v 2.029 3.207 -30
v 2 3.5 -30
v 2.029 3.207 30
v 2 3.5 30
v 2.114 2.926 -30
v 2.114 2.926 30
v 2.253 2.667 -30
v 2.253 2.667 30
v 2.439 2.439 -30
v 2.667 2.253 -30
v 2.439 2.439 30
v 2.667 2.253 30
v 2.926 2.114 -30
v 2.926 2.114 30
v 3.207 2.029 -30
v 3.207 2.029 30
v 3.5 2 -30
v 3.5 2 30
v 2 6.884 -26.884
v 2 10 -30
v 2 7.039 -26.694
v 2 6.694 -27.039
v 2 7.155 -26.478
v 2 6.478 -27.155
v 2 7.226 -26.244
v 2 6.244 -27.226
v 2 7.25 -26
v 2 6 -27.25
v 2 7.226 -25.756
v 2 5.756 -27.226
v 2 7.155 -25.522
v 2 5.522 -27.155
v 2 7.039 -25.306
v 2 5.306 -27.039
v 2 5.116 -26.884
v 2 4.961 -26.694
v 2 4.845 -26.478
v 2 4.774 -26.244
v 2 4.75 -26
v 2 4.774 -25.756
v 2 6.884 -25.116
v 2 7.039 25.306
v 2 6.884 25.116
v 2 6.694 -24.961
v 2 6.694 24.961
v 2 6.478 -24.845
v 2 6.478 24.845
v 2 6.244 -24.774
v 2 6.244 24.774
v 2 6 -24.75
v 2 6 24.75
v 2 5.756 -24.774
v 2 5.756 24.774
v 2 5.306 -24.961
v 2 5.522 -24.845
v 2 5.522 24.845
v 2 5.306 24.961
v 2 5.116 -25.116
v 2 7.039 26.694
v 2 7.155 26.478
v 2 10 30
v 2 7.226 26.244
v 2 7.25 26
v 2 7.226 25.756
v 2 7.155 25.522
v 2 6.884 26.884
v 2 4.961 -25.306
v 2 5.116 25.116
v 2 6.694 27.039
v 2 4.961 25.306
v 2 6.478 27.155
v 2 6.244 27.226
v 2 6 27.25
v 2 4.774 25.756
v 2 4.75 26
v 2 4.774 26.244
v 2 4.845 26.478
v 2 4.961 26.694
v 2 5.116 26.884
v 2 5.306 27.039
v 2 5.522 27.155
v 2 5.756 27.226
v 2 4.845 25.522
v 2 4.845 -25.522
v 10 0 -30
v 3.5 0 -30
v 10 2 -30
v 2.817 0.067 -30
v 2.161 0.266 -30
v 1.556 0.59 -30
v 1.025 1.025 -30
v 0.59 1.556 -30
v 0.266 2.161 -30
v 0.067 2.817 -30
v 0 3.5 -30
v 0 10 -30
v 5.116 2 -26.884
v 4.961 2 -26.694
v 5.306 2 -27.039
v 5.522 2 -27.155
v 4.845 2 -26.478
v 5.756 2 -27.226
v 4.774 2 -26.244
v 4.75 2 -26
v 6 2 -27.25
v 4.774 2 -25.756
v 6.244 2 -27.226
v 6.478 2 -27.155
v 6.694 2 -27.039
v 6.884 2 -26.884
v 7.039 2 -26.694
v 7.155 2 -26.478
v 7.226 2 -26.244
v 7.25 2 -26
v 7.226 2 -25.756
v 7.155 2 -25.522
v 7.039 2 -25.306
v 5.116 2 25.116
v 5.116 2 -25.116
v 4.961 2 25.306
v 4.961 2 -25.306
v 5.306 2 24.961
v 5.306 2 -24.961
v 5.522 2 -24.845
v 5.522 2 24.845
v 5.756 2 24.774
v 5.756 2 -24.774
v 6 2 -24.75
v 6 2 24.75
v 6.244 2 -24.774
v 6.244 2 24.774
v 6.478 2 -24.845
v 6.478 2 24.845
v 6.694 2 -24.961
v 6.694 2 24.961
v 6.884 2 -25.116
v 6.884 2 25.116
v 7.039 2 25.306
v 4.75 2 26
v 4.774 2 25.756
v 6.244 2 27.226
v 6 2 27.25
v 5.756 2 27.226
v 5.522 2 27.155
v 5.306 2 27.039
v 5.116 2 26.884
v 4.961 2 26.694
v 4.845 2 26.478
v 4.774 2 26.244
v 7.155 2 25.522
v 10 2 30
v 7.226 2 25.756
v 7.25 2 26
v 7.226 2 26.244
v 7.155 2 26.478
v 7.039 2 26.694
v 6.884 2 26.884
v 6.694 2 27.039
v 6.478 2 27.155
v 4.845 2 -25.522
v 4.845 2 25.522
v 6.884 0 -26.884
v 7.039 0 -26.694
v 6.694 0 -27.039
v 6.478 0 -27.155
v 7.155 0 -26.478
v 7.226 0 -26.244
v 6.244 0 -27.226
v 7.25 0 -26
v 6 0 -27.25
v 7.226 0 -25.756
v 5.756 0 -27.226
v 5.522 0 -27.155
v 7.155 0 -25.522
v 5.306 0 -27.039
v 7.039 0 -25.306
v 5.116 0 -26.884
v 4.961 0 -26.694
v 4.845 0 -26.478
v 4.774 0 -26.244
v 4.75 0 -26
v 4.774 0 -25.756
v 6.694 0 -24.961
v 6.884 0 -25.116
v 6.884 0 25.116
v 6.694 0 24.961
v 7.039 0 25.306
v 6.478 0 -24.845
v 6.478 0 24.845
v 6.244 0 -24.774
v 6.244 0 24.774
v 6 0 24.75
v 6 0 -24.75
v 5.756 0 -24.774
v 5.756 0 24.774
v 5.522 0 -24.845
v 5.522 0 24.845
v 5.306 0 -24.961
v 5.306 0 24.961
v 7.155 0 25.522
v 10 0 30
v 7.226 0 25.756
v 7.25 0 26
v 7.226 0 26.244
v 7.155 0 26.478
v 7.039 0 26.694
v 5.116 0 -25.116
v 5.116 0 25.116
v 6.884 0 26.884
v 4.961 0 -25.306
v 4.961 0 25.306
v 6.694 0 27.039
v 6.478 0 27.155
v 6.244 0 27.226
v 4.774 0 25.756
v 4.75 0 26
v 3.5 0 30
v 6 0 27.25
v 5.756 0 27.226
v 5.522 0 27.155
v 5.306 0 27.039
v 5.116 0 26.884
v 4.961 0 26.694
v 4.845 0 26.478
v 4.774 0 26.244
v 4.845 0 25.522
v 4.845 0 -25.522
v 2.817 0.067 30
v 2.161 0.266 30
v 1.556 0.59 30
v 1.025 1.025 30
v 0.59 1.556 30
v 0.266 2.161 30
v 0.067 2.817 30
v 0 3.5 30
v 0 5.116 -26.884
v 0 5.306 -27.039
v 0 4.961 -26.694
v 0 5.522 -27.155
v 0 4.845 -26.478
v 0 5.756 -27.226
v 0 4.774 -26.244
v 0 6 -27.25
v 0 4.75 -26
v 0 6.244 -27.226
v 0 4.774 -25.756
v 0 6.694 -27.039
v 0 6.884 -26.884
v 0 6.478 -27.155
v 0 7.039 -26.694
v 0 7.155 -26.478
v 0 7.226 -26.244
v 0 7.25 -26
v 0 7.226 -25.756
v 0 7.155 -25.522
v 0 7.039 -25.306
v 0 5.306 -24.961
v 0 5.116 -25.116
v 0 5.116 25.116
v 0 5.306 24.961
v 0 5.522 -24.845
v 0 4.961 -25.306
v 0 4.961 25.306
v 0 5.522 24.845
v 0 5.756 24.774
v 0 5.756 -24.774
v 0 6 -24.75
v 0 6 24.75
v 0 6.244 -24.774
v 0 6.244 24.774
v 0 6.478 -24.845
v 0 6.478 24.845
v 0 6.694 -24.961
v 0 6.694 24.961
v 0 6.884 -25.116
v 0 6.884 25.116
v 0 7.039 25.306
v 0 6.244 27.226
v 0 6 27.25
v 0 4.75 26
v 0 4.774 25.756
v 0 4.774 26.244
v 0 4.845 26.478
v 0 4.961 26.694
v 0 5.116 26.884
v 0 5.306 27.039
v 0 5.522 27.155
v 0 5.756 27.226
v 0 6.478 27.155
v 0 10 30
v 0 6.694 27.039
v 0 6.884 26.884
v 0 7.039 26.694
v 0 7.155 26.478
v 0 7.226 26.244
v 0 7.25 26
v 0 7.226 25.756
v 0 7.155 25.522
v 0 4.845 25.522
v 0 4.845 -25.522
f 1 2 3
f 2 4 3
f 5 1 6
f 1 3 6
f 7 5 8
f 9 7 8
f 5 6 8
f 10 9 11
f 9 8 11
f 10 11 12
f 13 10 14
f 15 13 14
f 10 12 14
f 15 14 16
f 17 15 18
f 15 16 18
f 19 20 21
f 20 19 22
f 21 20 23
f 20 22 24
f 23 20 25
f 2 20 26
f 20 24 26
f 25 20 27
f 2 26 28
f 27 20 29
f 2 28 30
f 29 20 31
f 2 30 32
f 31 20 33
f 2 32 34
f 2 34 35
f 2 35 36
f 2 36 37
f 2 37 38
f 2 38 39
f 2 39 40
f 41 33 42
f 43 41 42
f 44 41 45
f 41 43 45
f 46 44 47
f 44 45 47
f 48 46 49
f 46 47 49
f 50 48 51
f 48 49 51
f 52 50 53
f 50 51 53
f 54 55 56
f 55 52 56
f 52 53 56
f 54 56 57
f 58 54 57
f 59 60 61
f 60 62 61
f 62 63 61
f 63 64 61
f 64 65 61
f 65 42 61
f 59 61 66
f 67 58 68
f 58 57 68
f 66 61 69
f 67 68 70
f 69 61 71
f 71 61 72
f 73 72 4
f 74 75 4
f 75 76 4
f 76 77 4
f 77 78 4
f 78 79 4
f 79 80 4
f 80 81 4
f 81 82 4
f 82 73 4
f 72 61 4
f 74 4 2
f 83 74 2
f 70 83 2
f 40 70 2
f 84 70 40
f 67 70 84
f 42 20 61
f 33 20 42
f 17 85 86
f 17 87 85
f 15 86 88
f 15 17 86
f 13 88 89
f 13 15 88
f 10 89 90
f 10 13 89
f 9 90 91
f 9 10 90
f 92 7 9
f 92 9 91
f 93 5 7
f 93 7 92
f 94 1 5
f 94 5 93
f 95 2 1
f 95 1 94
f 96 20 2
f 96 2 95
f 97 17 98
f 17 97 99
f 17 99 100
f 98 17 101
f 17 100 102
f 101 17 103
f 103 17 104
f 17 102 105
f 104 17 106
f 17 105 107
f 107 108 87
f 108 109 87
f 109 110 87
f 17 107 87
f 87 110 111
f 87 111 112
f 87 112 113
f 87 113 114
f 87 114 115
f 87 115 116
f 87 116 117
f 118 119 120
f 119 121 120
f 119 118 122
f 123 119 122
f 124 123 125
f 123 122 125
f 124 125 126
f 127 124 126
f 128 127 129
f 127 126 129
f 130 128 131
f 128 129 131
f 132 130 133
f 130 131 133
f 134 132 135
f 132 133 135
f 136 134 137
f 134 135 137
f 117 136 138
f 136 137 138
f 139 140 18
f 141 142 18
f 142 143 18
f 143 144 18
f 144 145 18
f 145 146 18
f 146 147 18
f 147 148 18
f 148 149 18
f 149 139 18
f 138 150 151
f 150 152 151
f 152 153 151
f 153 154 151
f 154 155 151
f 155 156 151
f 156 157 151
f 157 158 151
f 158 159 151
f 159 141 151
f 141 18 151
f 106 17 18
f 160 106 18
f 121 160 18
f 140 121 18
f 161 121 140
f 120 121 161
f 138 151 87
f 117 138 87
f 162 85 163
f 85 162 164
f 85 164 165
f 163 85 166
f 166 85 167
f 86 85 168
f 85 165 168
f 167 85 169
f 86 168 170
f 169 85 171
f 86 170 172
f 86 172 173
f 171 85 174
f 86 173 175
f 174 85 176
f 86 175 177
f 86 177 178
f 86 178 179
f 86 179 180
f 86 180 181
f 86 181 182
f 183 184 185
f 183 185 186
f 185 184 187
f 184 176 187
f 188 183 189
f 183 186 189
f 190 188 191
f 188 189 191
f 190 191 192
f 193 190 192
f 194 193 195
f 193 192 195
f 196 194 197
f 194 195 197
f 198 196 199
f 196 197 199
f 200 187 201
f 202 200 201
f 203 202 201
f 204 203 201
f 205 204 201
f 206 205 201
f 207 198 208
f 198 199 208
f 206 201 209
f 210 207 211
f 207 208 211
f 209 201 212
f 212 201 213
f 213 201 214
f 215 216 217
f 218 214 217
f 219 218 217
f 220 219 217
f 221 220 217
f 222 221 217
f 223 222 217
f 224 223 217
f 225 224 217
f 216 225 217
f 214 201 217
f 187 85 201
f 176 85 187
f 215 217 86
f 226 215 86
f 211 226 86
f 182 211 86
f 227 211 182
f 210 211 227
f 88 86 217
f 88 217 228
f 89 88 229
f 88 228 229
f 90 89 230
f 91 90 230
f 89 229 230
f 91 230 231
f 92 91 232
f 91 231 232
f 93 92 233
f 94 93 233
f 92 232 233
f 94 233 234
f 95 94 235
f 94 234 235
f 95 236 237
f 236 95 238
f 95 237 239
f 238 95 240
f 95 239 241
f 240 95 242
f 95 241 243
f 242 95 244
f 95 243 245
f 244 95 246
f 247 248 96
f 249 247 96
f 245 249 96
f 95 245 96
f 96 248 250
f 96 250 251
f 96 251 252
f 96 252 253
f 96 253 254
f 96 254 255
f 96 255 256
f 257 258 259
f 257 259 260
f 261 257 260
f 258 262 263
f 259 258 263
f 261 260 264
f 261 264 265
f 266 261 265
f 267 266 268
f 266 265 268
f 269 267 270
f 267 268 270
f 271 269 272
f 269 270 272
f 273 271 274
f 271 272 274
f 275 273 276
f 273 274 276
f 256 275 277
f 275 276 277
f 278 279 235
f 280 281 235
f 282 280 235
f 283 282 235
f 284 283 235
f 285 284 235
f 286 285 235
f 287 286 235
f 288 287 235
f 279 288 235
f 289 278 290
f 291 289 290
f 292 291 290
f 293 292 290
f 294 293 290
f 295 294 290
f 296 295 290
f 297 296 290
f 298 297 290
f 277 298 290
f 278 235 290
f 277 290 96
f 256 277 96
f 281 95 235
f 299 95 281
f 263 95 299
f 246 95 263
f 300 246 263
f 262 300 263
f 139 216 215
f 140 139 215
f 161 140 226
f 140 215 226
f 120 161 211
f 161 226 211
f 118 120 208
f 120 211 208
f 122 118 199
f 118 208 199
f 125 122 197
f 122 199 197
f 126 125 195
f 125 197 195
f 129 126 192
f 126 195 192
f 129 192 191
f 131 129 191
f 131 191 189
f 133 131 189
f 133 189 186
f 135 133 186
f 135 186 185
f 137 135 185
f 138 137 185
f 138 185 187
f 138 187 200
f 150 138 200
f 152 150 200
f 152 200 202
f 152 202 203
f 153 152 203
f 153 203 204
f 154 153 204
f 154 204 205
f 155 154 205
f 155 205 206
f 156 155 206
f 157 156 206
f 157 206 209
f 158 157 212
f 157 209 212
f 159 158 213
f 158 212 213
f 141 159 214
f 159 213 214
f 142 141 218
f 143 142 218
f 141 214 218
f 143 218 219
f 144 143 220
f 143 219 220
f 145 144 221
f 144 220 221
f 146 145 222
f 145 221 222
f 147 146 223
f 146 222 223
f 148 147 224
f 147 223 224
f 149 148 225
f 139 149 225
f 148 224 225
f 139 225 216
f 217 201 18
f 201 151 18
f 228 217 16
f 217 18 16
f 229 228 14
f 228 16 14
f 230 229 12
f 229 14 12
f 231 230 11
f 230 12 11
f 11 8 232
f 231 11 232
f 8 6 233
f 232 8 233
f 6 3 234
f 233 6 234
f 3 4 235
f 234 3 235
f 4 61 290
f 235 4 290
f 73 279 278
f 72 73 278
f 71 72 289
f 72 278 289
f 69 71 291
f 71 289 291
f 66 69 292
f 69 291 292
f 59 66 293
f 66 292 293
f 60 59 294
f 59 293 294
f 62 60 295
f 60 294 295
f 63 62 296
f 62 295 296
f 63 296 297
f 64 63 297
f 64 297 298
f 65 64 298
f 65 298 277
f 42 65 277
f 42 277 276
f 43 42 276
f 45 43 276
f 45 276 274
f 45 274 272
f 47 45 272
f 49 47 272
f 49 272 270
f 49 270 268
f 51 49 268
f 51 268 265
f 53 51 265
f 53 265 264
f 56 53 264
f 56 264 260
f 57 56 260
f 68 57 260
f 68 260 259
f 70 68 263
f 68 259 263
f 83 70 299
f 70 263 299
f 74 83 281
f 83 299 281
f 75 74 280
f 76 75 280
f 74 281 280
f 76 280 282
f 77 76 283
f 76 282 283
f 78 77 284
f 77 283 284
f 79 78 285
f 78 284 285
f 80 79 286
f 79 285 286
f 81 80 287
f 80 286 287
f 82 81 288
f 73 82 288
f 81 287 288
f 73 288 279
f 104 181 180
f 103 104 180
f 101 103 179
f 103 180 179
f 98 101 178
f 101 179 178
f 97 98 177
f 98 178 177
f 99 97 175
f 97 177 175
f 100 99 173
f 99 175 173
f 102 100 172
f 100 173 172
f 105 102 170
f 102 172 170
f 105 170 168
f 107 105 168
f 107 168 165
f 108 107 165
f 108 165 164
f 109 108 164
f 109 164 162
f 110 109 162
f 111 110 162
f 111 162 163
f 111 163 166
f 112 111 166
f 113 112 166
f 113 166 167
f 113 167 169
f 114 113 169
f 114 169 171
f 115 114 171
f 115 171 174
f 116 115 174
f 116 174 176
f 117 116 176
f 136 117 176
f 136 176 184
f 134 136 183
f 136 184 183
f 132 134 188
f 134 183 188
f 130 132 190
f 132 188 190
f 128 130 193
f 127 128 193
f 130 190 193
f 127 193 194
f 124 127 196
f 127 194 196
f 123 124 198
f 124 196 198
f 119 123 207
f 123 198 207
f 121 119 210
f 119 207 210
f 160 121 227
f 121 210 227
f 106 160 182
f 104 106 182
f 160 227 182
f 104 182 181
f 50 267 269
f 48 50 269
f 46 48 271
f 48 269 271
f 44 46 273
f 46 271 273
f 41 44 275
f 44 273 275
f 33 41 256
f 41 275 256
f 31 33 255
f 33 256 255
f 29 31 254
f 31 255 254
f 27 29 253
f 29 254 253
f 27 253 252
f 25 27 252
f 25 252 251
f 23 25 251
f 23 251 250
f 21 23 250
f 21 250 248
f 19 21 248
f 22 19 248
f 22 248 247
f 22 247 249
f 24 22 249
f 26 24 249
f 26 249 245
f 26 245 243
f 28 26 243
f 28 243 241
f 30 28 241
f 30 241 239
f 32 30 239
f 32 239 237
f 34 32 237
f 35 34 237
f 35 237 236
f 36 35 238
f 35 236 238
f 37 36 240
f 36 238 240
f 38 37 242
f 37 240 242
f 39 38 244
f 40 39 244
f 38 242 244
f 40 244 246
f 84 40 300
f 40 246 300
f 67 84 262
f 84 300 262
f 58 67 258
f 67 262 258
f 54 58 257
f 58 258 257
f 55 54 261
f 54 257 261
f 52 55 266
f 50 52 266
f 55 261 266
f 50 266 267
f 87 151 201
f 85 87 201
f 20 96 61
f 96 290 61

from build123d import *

# Parameters (mm, degrees)
BASE_FLANGE1_DEPTH = 30
M3_TAPPED_HOLE1_D  = 2.5
M3_TAPPED_HOLE2_D  = 2.5


# Sheet-metal steps are written as plain solids
with BuildPart() as part:
    # Sketch1 → Base-Flange1 (new, symmetric)
    with BuildSketch(Plane.XY):
        with BuildLine():
            Line((10, 0), (3.5, 0))
            ThreePointArc((3.5, 0), (1.025126266, 1.025126266), (0, 3.5))
            Line((0, 3.5), (0, 10))
            Line((0, 10), (2, 10))
            Line((2, 10), (2, 3.5))
            ThreePointArc((2, 3.5), (2.439339828, 2.439339828), (3.5, 2))
            Line((3.5, 2), (10, 2))
            Line((10, 2), (10, 0))
        make_face()
    extrude(amount=BASE_FLANGE1_DEPTH, both=True)

    # M3 Tapped Hole1 (through all)
    with Locations(Plane(origin=(2, 0, 0), x_dir=(0, 0, -1), z_dir=(1, 0, 0))):
        with Locations((-26, 6), (26, 6)):
            Hole(M3_TAPPED_HOLE1_D / 2)

    # M3 Tapped Hole2 (through all)
    with Locations(Plane(origin=(0, 2, 0), x_dir=(1, 0, 0), z_dir=(0, 1, 0))):
        with Locations((6, -26), (6, 26)):
            Hole(M3_TAPPED_HOLE2_D / 2)


solid = part.part
